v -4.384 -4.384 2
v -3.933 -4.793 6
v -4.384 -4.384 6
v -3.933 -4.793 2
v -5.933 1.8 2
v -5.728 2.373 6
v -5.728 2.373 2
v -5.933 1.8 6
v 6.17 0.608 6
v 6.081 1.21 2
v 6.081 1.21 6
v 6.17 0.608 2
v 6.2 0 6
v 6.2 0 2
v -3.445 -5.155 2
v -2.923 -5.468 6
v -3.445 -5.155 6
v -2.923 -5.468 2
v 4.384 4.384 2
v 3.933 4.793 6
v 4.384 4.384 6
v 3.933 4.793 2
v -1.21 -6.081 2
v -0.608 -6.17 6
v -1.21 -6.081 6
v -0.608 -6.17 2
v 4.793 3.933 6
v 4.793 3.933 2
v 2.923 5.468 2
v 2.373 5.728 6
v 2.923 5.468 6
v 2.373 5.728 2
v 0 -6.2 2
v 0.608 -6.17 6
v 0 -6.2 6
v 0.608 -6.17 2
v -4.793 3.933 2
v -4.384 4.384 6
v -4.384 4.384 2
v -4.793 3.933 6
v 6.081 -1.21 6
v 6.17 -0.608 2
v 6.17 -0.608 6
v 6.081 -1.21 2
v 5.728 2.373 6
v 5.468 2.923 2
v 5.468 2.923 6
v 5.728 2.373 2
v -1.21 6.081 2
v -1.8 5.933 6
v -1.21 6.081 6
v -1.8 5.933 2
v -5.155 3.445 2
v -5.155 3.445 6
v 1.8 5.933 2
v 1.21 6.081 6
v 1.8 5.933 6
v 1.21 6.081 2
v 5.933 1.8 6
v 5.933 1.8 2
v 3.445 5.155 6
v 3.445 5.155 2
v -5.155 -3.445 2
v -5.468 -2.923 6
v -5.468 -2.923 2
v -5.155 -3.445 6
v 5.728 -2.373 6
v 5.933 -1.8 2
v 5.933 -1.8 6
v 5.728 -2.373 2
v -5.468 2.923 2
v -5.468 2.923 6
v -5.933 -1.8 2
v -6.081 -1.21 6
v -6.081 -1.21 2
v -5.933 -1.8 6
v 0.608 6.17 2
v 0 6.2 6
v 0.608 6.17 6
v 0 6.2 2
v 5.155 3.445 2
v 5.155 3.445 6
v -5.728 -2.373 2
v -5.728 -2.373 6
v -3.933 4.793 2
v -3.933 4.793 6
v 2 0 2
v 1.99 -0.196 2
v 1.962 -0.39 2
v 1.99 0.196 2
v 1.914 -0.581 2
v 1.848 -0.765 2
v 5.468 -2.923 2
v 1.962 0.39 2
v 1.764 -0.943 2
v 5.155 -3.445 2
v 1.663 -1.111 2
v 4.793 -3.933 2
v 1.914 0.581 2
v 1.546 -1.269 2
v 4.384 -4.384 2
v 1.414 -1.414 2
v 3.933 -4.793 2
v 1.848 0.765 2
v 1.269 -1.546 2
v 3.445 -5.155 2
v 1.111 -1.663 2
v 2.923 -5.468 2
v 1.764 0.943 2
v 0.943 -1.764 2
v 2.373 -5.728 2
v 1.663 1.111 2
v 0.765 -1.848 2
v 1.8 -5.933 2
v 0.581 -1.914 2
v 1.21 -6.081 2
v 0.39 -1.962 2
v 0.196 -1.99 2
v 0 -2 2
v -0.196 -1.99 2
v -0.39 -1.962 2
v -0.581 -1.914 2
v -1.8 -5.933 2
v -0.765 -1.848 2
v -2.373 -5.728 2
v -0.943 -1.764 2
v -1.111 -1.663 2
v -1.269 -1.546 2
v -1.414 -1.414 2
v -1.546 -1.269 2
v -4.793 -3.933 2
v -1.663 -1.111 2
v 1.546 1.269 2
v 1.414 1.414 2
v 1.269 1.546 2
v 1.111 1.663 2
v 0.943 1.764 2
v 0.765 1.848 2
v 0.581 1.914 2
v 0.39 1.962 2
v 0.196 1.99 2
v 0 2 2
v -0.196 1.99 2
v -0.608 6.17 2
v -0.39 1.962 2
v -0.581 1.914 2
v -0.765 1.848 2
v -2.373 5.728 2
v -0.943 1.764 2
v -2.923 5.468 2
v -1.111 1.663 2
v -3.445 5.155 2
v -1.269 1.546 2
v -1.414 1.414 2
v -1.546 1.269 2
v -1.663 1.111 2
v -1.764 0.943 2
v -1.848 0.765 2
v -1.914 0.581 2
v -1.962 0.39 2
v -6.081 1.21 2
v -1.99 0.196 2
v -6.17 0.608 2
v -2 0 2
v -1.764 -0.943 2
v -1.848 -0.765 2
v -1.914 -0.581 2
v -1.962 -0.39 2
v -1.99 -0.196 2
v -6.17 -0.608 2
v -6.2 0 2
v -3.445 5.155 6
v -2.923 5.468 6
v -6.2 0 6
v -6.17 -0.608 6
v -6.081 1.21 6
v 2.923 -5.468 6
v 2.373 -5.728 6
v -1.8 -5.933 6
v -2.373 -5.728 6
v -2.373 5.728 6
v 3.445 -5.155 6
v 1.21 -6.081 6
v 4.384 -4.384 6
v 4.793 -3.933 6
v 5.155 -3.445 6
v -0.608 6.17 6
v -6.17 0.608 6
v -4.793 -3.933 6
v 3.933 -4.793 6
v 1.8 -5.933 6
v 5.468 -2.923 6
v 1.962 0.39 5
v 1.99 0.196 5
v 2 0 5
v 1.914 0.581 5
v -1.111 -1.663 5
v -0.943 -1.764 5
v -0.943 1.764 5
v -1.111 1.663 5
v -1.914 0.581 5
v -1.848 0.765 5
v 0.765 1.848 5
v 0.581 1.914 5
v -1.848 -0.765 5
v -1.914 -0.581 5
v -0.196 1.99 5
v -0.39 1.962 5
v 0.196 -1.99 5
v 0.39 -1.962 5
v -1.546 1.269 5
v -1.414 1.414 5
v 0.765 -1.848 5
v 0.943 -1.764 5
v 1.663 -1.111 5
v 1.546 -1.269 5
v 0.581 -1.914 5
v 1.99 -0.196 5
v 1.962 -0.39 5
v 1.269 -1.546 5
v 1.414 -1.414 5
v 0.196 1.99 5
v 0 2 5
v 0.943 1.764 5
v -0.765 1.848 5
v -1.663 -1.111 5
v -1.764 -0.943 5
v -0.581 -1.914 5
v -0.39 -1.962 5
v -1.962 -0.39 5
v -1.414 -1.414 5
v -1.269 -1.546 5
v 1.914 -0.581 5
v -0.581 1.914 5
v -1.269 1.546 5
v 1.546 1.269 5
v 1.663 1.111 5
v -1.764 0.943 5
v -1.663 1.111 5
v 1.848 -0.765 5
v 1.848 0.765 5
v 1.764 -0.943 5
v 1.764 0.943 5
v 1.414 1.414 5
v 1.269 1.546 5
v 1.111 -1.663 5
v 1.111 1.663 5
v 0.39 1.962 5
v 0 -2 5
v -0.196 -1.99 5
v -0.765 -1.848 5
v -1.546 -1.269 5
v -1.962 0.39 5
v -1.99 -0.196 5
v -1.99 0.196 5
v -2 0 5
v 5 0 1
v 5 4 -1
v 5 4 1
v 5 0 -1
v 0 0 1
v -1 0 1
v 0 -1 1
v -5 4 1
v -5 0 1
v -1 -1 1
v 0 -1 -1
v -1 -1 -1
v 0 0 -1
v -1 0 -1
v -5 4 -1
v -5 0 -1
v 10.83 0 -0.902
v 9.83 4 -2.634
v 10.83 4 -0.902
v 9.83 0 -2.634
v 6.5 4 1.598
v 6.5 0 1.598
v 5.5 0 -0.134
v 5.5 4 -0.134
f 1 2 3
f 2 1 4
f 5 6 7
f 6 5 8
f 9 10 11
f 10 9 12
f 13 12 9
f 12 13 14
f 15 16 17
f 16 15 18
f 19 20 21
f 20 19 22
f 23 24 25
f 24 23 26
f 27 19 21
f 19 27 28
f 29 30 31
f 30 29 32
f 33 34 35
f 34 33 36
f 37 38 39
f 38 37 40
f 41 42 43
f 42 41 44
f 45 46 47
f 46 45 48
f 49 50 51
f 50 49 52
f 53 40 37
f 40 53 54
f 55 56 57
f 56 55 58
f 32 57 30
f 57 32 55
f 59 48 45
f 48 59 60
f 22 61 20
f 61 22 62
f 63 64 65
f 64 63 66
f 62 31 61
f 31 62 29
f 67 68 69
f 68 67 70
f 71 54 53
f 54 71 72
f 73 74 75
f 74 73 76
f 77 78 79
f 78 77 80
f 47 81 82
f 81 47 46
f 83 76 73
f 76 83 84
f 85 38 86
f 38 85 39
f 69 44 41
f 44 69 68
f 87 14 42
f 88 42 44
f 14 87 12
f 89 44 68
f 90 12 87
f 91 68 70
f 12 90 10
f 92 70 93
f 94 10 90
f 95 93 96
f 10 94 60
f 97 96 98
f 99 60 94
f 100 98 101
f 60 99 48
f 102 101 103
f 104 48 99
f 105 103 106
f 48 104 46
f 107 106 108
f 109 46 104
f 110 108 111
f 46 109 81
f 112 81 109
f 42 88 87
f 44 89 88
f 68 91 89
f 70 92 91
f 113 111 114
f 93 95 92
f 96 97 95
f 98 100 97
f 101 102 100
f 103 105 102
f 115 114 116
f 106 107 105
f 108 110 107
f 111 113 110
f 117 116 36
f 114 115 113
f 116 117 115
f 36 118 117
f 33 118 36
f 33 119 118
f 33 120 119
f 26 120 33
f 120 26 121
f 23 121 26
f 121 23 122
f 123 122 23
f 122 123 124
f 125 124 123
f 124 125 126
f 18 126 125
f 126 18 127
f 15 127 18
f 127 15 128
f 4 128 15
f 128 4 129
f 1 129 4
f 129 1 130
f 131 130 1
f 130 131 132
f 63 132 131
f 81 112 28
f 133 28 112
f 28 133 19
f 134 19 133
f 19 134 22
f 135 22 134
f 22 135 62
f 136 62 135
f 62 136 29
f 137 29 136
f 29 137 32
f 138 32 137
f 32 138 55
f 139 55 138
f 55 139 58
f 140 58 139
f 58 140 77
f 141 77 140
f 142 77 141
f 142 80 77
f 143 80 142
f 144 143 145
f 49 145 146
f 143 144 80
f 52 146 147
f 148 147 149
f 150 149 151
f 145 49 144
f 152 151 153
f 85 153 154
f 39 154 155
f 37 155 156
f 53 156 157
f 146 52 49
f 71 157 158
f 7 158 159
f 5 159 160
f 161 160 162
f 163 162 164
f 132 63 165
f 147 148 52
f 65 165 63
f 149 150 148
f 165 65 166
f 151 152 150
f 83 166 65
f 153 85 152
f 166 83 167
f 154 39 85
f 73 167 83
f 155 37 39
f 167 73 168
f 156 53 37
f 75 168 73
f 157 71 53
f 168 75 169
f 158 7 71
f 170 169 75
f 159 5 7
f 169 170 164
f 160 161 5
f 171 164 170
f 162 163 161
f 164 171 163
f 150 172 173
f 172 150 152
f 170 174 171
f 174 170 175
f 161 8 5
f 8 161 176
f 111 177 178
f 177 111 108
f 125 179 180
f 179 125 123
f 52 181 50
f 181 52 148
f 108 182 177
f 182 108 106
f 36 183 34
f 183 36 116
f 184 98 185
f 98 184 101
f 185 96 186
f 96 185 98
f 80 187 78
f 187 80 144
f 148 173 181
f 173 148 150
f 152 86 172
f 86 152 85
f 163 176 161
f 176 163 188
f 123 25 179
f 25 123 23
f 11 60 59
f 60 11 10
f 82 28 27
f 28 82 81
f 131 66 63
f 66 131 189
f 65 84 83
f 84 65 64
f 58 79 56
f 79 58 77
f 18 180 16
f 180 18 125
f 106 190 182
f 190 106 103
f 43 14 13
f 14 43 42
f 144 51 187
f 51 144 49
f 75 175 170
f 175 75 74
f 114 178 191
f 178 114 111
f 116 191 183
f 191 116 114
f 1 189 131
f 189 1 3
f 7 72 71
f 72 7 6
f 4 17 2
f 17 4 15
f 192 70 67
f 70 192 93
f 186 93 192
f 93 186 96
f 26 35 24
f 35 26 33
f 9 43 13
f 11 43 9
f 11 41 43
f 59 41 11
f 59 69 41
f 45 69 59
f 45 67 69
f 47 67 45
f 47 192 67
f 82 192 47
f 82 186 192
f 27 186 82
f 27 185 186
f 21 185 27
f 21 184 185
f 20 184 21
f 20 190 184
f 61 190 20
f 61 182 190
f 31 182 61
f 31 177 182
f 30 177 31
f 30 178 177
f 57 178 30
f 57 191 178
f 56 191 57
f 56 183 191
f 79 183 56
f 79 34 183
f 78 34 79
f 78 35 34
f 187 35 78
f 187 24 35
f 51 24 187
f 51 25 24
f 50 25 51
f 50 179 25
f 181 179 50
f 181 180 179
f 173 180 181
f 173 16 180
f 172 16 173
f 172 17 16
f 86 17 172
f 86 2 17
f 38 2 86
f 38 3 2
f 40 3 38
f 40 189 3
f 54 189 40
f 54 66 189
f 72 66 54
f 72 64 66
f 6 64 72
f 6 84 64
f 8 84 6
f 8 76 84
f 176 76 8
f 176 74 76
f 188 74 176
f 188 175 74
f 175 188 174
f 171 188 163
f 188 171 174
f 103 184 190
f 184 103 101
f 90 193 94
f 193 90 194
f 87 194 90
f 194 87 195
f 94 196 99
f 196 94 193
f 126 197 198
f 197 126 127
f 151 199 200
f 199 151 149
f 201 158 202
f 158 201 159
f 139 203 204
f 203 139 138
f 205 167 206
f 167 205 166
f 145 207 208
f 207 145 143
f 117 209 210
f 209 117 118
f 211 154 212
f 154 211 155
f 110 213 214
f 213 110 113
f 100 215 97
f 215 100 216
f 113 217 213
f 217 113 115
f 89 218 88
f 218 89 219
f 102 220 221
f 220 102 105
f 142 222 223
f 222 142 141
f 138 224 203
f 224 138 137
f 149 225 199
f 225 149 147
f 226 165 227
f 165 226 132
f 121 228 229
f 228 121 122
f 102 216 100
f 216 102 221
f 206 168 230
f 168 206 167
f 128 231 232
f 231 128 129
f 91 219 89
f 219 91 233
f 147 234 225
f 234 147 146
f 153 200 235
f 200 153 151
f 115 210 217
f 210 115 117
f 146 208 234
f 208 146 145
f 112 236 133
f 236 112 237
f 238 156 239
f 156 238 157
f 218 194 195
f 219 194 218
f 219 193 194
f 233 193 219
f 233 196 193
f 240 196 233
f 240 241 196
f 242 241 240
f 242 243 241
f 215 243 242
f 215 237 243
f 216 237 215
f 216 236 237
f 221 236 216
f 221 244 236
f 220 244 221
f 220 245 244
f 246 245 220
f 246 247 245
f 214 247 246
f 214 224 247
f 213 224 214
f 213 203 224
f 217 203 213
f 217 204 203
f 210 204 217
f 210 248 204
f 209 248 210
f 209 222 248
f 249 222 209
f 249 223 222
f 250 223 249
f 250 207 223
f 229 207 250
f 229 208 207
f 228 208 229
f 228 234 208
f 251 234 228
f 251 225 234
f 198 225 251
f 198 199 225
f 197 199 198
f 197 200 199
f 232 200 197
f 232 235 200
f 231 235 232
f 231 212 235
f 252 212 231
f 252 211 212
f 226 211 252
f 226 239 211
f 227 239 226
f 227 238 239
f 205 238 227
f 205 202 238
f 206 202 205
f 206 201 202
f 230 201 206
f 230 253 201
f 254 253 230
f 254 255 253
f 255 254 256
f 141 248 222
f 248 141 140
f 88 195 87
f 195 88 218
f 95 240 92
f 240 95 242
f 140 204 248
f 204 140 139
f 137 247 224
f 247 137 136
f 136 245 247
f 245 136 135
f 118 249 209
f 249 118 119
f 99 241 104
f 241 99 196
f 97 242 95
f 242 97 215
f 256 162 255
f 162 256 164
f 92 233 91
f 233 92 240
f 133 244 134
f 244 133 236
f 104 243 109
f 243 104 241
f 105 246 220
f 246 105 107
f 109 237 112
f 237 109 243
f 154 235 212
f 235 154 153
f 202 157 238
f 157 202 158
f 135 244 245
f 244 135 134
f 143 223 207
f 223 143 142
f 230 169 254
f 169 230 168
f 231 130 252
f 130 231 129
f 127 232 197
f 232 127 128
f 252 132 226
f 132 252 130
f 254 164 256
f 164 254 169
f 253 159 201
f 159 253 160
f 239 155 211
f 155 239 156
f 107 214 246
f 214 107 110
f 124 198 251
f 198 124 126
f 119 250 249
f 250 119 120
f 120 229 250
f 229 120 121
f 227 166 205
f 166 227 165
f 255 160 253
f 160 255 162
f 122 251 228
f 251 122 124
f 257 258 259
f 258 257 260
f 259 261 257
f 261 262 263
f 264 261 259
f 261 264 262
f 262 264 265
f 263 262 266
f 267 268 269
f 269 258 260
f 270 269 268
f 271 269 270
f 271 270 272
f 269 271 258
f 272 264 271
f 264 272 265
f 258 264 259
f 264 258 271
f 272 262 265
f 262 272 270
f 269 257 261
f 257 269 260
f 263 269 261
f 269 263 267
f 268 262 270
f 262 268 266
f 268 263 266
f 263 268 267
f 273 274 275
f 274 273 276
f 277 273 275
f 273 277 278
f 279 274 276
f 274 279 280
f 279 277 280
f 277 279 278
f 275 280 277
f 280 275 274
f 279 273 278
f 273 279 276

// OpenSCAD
module bracket() {
    // Parameters
    lug_radius = 6.2;
    lug_thickness = 4;
    hole_radius = 2;
    arm_length = 10;
    arm_width = 4;
    arm_thickness = 2;
    pad_length = 5;
    pad_width = 4;
    pad_thickness = 2;
    pad_angle = 30;
    u_notch_width = 2;
    u_notch_depth = 1;

    // Lug with through-hole
    difference() {
        translate([0, 0, lug_thickness / 2])
            cylinder(r = lug_radius, h = lug_thickness, $fn = 64);
        translate([0, 0, -1])
            cylinder(r = hole_radius, h = lug_thickness + 2, $fn = 64);
    }

    // Arm
    translate([-arm_length / 2, 0, -arm_thickness / 2])
        cube([arm_length, arm_width, arm_thickness]);

    // U-shaped notch
    translate([-u_notch_depth, -u_notch_width / 2, -arm_thickness / 2])
        cube([u_notch_depth, u_notch_width, arm_thickness]);

    // End pad
    translate([arm_length / 2, 0, -pad_thickness / 2])
        rotate([0, pad_angle, 0])
        translate([0, 0, pad_thickness / 2])
        cube([pad_length, pad_width, pad_thickness]);
}

bracket();
